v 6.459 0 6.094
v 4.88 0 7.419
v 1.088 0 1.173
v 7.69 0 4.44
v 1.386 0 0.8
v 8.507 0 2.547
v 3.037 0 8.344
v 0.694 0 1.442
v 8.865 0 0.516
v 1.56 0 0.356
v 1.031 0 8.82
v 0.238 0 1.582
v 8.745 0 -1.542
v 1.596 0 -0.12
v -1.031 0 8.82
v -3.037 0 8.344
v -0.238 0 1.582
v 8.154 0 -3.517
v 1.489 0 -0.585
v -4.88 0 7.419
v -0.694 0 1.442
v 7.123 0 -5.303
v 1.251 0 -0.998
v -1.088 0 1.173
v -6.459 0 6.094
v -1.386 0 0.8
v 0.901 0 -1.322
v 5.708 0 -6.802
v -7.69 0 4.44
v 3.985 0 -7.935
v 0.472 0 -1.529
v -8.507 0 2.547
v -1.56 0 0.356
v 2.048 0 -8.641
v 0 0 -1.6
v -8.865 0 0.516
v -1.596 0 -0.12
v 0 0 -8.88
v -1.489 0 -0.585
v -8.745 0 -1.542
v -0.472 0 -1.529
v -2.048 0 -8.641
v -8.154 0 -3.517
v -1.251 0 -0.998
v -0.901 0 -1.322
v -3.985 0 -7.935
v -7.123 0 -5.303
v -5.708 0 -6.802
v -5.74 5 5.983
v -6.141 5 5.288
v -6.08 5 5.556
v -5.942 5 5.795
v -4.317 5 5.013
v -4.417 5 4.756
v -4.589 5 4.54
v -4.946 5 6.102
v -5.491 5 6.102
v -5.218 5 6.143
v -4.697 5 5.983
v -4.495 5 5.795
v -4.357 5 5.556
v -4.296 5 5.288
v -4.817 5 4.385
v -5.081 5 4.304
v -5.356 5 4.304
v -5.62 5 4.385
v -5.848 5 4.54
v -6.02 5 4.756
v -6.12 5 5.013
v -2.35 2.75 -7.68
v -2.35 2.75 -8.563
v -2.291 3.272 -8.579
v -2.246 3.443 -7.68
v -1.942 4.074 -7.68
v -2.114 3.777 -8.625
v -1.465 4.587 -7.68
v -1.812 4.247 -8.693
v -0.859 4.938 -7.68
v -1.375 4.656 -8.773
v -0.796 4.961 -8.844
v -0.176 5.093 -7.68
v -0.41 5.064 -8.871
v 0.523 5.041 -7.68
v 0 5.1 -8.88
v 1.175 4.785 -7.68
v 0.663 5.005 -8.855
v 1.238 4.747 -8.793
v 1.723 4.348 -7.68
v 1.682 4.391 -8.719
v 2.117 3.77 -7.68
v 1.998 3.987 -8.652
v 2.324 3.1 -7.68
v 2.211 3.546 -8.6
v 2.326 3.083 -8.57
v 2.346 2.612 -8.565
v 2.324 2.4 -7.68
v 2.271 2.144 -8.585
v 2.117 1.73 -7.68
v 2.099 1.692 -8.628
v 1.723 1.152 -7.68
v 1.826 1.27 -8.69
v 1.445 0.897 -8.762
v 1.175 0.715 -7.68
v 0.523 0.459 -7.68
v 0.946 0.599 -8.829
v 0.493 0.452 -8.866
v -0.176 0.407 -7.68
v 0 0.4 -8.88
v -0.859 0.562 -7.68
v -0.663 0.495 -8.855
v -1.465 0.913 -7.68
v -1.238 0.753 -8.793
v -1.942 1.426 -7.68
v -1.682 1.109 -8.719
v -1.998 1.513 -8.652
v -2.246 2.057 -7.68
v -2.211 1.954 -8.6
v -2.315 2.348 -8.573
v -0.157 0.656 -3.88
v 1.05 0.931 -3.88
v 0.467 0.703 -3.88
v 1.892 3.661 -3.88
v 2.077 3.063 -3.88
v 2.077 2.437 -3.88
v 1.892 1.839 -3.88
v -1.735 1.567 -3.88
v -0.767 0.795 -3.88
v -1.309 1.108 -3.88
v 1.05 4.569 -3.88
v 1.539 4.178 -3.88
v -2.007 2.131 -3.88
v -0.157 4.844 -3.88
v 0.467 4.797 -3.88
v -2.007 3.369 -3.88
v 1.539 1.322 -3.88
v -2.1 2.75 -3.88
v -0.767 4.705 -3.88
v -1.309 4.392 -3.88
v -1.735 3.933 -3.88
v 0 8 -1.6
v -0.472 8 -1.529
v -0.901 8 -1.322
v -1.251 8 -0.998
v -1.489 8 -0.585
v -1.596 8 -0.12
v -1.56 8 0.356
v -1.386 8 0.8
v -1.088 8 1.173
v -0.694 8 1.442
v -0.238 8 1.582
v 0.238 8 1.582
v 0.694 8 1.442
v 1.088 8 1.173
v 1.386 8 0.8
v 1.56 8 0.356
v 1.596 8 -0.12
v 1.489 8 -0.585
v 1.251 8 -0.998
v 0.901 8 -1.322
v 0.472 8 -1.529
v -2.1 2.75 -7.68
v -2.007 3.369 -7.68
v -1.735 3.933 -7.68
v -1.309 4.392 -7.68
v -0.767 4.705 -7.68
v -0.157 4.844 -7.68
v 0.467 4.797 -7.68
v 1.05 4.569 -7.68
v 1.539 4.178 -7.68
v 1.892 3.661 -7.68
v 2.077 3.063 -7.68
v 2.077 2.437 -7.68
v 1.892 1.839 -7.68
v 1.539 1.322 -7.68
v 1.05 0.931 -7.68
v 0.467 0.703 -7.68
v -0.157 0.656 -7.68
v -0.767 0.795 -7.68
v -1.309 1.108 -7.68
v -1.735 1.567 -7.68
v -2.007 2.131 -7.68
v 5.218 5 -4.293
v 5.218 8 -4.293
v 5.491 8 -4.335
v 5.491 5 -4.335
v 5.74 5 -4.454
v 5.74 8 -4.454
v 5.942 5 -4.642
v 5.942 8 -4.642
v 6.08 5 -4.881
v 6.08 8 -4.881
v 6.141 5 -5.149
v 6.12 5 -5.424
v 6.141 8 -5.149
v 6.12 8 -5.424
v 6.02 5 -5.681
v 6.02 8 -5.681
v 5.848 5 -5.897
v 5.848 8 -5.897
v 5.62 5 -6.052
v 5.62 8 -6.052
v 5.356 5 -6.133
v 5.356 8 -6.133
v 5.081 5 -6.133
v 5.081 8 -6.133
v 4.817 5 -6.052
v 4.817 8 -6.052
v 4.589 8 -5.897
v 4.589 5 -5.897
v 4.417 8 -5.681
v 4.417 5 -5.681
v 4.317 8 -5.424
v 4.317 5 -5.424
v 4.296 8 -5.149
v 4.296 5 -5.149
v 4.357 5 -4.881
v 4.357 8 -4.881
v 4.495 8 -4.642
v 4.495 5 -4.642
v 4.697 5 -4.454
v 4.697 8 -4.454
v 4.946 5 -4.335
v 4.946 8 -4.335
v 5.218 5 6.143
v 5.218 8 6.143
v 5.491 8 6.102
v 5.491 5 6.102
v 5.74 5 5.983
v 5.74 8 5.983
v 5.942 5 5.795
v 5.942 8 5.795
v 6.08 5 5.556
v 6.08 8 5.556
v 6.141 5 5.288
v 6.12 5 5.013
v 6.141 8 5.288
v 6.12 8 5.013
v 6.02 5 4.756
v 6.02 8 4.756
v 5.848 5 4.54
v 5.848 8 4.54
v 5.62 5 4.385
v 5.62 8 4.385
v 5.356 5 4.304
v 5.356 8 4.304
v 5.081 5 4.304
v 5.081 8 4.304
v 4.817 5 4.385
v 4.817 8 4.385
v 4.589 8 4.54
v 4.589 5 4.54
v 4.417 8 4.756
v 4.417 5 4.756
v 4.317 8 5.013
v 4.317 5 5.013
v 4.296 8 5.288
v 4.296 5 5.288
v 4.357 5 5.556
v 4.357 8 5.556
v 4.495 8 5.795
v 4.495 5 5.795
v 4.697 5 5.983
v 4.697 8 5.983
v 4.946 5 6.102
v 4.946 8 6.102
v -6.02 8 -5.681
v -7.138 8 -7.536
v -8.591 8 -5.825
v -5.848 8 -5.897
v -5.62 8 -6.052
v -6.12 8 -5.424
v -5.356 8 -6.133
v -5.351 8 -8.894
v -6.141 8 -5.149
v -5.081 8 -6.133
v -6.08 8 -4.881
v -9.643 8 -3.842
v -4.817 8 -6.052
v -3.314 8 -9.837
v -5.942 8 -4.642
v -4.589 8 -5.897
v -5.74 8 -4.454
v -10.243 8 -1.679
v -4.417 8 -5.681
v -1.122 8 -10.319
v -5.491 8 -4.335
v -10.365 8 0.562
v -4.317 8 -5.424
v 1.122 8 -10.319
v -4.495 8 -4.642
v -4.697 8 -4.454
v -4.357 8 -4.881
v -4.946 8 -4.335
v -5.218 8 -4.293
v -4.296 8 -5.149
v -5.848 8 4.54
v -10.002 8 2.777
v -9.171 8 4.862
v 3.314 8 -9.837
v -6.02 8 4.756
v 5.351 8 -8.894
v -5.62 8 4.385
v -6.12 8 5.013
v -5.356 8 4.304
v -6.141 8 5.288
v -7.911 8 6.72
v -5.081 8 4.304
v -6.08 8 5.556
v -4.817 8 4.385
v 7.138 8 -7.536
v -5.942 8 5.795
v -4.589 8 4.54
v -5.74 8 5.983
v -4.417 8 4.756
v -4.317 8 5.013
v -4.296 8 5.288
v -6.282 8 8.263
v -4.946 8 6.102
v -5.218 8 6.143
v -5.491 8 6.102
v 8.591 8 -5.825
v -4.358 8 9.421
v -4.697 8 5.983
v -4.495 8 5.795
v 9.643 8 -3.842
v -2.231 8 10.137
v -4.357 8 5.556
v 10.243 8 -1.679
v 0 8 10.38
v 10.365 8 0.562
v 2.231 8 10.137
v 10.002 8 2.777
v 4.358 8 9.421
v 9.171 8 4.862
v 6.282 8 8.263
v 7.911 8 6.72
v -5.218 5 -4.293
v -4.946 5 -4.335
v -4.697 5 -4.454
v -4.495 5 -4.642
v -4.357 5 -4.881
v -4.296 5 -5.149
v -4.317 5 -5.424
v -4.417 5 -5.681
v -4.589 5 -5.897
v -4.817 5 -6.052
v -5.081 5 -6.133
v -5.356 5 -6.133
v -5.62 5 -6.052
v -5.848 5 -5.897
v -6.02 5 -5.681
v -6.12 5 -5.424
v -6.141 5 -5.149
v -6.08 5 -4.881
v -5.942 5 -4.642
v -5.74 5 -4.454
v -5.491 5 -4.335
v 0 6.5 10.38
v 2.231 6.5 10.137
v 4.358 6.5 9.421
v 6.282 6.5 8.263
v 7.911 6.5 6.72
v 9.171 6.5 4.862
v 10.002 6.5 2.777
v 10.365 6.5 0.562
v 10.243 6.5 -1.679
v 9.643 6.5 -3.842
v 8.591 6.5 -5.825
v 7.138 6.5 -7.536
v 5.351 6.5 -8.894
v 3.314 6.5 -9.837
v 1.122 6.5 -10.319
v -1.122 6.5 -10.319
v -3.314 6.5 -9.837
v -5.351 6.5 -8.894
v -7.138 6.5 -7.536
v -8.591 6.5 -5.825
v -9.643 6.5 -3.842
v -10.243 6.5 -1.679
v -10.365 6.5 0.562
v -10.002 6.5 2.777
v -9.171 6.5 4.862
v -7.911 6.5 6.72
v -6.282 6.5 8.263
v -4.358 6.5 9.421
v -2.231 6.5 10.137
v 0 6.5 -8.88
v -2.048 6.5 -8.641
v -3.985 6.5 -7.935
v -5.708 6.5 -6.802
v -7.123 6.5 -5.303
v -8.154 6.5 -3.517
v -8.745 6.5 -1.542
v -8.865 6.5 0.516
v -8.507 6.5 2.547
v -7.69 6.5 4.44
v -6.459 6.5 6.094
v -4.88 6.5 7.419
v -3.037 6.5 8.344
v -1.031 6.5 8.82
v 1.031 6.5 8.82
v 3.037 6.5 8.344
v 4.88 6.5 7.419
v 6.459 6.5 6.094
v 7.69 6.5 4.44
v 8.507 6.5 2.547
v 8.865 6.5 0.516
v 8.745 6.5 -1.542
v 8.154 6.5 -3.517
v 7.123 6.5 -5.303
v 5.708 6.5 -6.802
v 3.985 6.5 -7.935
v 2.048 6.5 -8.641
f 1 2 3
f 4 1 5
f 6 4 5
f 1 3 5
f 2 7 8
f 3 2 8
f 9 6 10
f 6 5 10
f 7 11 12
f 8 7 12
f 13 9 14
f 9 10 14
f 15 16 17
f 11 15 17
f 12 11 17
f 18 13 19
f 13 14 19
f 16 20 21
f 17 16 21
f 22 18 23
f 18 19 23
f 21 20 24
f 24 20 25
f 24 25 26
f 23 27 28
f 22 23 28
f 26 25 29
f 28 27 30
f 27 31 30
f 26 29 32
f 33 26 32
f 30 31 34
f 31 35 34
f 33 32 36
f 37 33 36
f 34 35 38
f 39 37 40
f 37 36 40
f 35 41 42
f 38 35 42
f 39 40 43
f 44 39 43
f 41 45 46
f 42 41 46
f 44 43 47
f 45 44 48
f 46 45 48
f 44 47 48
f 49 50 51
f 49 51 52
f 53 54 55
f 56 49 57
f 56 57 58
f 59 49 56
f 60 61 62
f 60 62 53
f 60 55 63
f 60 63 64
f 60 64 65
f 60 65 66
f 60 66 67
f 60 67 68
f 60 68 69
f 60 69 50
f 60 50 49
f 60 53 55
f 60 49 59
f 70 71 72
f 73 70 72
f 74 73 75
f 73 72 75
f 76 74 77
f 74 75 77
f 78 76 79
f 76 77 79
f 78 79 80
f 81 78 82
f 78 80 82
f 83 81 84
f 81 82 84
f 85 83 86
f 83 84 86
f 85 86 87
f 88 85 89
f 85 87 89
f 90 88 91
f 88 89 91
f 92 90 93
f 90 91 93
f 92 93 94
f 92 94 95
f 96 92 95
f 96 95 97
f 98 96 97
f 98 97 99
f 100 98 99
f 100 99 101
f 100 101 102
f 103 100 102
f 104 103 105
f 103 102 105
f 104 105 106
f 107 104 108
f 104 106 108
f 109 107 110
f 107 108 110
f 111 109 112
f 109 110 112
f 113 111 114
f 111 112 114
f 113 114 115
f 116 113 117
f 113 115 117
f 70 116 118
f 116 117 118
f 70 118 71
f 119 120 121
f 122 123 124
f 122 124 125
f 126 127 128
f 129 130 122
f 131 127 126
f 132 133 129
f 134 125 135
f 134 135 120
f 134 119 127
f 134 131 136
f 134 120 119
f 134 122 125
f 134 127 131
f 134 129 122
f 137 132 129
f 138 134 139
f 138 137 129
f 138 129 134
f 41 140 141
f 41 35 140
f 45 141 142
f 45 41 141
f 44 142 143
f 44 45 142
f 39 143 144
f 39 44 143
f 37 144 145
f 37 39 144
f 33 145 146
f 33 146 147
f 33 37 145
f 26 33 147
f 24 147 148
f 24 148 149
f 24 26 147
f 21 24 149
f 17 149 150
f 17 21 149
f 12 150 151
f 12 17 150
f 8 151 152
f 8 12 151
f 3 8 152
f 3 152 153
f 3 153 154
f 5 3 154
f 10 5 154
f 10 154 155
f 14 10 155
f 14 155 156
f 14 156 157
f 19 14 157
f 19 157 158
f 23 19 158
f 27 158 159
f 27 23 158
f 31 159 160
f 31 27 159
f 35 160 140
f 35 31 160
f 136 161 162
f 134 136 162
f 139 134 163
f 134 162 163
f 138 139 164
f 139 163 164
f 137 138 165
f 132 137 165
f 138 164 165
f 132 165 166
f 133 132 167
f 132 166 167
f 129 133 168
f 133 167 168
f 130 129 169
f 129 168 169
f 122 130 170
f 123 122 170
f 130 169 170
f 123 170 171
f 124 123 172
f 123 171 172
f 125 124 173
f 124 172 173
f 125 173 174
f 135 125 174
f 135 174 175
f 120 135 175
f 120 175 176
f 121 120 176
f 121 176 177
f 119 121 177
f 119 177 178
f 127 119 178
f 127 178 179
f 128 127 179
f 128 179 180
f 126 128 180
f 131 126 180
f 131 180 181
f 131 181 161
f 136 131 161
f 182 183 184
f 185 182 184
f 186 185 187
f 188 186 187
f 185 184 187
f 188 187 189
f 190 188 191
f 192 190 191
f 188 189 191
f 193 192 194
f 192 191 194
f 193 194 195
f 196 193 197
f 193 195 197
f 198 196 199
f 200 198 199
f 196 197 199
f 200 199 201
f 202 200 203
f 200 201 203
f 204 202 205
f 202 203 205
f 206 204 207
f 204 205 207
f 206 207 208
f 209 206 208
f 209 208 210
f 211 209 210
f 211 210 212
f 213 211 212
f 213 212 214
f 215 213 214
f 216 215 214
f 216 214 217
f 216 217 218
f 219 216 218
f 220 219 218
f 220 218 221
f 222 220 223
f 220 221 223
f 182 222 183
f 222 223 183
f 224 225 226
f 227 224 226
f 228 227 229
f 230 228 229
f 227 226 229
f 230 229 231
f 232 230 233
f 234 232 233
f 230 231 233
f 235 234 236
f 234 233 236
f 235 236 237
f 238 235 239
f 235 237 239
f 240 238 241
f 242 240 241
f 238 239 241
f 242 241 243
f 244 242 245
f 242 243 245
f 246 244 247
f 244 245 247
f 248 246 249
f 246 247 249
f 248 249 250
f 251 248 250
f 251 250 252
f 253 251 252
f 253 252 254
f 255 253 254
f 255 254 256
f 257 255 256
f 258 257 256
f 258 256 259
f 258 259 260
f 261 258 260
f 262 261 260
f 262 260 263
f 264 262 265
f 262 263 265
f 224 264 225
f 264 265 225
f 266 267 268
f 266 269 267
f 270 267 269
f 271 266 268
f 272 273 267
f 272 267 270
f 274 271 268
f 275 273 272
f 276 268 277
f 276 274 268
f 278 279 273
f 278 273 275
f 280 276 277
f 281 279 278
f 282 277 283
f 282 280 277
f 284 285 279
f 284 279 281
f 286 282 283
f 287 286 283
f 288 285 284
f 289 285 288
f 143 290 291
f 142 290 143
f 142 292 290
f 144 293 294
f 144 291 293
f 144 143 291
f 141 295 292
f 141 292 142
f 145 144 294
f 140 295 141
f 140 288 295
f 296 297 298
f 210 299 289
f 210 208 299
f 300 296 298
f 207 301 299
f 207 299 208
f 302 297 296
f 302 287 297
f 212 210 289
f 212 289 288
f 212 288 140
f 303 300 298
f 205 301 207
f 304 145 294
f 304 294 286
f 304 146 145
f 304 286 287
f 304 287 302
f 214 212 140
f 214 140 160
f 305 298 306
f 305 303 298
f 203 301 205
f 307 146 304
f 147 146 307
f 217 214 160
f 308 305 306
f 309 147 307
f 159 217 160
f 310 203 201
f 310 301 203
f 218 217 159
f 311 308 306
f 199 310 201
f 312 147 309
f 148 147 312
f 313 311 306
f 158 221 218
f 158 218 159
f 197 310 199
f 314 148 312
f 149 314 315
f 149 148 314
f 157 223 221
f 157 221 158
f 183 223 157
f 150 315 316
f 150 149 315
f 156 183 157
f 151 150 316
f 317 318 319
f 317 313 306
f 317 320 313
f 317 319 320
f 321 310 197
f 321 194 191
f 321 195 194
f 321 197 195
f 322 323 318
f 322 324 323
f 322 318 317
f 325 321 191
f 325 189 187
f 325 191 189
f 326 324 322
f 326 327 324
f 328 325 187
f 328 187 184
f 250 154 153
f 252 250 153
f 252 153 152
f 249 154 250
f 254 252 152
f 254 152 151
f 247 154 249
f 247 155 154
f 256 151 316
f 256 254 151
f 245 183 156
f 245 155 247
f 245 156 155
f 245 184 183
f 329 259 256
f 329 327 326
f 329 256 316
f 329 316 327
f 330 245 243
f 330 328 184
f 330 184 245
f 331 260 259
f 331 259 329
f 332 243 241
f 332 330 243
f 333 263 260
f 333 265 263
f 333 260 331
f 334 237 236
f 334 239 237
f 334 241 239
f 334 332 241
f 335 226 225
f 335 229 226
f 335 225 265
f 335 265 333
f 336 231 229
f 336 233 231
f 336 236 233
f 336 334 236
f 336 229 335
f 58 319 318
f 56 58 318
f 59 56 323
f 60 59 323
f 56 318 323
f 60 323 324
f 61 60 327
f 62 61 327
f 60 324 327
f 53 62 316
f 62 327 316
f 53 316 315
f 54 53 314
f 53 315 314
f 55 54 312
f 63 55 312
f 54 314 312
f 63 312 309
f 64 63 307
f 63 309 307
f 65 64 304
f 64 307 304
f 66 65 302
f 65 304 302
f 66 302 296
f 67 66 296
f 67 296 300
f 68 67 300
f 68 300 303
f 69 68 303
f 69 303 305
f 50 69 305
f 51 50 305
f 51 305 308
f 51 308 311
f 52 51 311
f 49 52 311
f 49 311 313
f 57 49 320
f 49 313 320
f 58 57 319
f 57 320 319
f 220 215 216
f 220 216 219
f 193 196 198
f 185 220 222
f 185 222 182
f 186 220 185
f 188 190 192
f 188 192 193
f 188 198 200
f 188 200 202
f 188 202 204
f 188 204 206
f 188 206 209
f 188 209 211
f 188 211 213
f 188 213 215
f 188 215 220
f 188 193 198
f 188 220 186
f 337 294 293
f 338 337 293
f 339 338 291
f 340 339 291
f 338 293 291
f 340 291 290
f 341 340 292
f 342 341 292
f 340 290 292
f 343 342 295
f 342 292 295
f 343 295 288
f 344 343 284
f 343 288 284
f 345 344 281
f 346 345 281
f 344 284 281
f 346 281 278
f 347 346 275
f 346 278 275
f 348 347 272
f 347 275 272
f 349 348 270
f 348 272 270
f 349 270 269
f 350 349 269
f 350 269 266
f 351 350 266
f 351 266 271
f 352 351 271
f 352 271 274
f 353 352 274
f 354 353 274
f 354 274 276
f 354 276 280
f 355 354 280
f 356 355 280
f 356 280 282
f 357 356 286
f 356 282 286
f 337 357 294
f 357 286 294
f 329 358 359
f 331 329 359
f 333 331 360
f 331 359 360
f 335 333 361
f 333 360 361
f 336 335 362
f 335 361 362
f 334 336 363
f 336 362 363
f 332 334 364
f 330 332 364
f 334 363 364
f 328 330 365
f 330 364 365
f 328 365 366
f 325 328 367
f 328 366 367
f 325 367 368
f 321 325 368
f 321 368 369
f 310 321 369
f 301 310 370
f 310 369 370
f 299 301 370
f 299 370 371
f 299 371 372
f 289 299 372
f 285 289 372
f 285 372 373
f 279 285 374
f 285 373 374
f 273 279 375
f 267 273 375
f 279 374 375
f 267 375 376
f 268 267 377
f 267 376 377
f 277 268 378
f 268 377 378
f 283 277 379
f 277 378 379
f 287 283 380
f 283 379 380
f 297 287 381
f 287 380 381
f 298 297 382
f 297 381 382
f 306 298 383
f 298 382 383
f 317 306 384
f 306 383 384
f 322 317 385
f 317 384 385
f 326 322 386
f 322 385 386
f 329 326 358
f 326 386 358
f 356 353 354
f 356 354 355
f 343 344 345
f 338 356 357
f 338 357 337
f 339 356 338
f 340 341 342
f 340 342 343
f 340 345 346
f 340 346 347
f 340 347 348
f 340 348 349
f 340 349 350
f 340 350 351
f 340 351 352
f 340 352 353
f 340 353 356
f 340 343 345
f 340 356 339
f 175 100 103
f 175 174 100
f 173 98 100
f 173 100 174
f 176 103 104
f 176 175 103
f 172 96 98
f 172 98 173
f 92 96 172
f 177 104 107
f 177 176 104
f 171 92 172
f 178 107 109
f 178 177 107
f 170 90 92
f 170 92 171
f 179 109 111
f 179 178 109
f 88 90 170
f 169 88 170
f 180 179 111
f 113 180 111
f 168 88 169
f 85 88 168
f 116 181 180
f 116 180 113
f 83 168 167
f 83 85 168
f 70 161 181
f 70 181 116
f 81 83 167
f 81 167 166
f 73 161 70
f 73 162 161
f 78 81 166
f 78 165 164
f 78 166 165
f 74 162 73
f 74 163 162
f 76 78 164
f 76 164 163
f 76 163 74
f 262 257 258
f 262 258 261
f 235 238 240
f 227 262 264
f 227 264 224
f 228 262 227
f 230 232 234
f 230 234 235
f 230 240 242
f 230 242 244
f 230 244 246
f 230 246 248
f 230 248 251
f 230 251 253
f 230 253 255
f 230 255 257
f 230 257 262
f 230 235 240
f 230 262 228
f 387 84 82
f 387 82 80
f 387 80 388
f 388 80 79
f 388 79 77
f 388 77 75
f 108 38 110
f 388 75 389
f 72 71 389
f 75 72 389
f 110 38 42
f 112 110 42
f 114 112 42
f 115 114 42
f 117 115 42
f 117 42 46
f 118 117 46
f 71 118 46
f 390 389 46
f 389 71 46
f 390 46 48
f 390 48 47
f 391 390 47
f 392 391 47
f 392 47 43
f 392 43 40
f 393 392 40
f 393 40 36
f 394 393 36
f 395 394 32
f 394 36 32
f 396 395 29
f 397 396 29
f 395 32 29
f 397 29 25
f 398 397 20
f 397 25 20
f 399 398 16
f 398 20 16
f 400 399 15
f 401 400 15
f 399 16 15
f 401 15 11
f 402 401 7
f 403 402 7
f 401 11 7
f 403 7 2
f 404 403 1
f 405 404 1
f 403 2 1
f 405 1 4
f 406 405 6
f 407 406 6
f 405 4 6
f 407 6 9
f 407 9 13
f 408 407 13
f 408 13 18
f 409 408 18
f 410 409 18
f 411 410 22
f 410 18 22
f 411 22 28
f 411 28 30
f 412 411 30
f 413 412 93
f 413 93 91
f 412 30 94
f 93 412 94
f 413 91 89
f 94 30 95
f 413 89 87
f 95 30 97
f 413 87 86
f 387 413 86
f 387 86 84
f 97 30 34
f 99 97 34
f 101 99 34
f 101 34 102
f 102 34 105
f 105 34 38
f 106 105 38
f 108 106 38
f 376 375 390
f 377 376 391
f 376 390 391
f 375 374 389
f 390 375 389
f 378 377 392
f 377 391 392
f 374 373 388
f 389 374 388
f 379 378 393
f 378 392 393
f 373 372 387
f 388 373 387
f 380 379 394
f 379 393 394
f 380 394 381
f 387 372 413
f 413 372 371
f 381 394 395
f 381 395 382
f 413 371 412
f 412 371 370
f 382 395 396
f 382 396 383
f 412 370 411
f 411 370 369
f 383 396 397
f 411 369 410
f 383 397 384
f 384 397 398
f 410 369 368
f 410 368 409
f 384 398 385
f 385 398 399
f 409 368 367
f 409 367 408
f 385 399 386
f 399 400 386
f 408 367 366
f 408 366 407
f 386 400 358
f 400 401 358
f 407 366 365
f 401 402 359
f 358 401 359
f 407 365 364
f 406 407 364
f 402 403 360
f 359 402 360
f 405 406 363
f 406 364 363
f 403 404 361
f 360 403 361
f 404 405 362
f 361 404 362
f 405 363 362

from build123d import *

# Parameters (mm, degrees)
SKETCH1_R           = 8.88
SKETCH1_R_2         = 1.6
BOSS_EXTRUDE1_DEPTH = 6.5
BOSS_EXTRUDE2_START = 6.5
SKETCH1_3_R         = 10.38
SKETCH1_3_R_2       = 1.6
BOSS_EXTRUDE2_DEPTH = 1.5
SKETCH2_R           = 2.35
SKETCH2_R_2         = 2.1
CUT_EXTRUDE1_DEPTH  = 1.2
SKETCH2_2_R         = 2.1
CUT_EXTRUDE2_DEPTH  = 5
SKETCH3_R           = 0.925
CUT_EXTRUDE3_DEPTH  = 3


with BuildPart() as part:
    # Sketch1 → Boss-Extrude1 (new body)
    with BuildSketch(Plane(origin=(0, 0, 0), x_dir=(1, 0, 0), z_dir=(0, 1, 0))):
        with Locations(Location((0, 0, 0), (0, 0, 90))):
            Circle(SKETCH1_R)
        with Locations(Location((0, 0, 0), (0, 0, 90))):
            Circle(SKETCH1_R_2, mode=Mode.SUBTRACT)
    extrude(amount=BOSS_EXTRUDE1_DEPTH)

    # Sketch1<3> → Boss-Extrude2 (add)
    with BuildSketch(Plane(origin=(0, 0, 0), x_dir=(1, 0, 0), z_dir=(0, 1, 0)).offset(BOSS_EXTRUDE2_START)):
        with Locations(Location((0, 0, 0), (0, 0, 270))):
            Circle(SKETCH1_3_R)
        with Locations(Location((0, 0, 0), (0, 0, 90))):
            Circle(SKETCH1_3_R_2, mode=Mode.SUBTRACT)
    extrude(amount=BOSS_EXTRUDE2_DEPTH)

    # Sketch2 → Cut-Extrude1 (cut)
    with BuildSketch(Plane(origin=(0, 0, -8.88), x_dir=(-1, 0, 0), z_dir=(0, 0, -1))):
        with Locations((0, 2.75)):
            Circle(SKETCH2_R)
        with Locations((0, 2.75)):
            Circle(SKETCH2_R_2, mode=Mode.SUBTRACT)
    extrude(amount=-CUT_EXTRUDE1_DEPTH, mode=Mode.SUBTRACT)

    # Sketch2<2> → Cut-Extrude2 (cut)
    with BuildSketch(Plane(origin=(0, 0, -8.88), x_dir=(-1, 0, 0), z_dir=(0, 0, -1))):
        with Locations((0, 2.75)):
            Circle(SKETCH2_2_R)
    extrude(amount=-CUT_EXTRUDE2_DEPTH, mode=Mode.SUBTRACT)

    # Sketch3 → Cut-Extrude3 (cut)
    with BuildSketch(Plane(origin=(0, 8, 0), x_dir=(1, 0, 0), z_dir=(0, 1, 0))):
        with Locations(Location((-5.218448045, 5.218448045, 0), (0, 0, 270))):
            Circle(SKETCH3_R)
        with Locations(Location((-5.218448045, -5.218448045, 0), (0, 0, 270))):
            Circle(SKETCH3_R)
        with Locations(Location((5.218448045, -5.218448045, 0), (0, 0, 270))):
            Circle(SKETCH3_R)
        with Locations(Location((5.218448045, 5.218448045, 0), (0, 0, 270))):
            Circle(SKETCH3_R)
    extrude(amount=-CUT_EXTRUDE3_DEPTH, mode=Mode.SUBTRACT)


solid = part.part
